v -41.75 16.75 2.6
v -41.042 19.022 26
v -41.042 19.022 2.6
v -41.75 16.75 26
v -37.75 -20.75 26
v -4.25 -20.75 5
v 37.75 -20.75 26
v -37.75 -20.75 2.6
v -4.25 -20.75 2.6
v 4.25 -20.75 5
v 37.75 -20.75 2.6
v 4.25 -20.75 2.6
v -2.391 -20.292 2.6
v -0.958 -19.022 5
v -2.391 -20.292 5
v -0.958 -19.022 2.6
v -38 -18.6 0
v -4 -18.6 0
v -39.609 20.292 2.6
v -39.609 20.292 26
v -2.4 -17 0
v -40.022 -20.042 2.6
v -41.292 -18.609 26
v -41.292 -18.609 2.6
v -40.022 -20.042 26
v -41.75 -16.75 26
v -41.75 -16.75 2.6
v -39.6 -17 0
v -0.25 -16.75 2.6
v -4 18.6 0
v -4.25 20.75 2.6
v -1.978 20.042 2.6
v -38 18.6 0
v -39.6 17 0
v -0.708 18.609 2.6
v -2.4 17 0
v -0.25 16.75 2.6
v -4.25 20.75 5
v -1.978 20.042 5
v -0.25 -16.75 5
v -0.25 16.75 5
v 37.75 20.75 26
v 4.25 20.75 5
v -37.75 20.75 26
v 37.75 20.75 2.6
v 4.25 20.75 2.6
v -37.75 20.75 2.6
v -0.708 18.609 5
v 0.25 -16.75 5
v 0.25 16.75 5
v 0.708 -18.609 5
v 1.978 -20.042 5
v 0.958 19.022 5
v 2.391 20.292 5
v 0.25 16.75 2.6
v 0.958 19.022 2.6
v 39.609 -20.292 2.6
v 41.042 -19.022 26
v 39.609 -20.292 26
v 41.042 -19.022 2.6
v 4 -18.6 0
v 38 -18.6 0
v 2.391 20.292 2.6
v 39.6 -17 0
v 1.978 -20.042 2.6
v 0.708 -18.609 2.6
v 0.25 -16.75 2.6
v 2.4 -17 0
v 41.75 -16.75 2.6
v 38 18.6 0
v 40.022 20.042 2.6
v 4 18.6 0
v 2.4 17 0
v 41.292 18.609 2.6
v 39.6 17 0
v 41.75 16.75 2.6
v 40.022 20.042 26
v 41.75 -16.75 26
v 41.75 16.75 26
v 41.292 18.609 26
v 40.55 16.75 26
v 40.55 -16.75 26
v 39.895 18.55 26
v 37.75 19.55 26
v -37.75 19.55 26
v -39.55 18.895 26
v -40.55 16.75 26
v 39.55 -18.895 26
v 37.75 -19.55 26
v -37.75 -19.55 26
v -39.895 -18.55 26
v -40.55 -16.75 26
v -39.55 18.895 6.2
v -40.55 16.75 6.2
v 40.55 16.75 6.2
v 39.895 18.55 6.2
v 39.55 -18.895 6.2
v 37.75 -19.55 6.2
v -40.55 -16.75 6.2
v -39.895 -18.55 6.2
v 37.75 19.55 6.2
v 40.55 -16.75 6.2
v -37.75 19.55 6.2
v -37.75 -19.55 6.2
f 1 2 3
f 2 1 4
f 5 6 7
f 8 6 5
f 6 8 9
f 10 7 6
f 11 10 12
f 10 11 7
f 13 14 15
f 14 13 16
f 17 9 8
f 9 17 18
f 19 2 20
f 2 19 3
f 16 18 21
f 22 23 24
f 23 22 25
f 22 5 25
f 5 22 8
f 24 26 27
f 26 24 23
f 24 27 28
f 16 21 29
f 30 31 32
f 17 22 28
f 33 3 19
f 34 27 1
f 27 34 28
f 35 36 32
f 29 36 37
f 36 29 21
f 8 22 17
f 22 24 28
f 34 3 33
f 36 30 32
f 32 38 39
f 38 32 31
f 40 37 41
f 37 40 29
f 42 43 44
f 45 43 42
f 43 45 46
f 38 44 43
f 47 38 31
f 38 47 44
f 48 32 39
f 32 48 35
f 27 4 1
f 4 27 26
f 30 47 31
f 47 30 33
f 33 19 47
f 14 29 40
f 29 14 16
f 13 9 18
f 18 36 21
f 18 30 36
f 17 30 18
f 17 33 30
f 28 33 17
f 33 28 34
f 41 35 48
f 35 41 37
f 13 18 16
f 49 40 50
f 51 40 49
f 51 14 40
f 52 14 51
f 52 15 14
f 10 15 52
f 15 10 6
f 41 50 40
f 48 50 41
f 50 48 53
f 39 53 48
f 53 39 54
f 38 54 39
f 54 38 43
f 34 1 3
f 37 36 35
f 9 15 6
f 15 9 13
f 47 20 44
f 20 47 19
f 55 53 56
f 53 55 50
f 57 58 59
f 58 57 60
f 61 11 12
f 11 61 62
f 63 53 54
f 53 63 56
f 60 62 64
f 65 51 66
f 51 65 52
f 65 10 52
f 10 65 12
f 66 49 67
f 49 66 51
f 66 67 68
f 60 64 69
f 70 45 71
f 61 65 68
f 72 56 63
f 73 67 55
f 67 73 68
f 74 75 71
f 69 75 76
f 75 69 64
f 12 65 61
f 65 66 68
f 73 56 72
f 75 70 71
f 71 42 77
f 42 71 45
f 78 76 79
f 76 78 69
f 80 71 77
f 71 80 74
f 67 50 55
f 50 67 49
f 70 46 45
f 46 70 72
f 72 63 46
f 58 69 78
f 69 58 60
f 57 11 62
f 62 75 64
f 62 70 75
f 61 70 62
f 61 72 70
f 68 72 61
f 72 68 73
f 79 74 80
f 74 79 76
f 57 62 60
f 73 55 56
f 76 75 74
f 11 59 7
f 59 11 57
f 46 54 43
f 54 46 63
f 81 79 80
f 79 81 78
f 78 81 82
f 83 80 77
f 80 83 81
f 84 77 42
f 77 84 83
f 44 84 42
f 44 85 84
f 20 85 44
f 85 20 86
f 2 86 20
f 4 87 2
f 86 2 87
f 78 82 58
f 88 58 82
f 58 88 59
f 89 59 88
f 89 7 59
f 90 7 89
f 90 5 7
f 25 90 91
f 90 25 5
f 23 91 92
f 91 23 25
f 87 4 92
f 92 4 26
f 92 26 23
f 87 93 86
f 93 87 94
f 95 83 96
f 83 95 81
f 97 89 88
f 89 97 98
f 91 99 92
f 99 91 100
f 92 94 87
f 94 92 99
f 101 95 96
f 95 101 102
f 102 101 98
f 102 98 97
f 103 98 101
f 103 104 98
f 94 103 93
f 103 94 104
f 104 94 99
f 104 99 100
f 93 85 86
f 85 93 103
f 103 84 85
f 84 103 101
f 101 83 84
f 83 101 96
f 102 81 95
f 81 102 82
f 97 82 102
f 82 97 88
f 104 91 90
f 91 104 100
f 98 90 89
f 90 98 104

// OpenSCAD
// Gridfinity-style storage bin: rounded base pads on a 42 mm grid, hollow walls
units_x = 2;       // [1:6]
units_y = 1;       // [1:6]
height_u = 3;      // [1:10]
/* [Hidden] */
grid = 42;
pad = 41.5;
pad_r = 4;
base_h = 5;
unit_h = 7;
wall = 1.2;

module rounded_square(s, r) {
  offset(r = r) square([s[0] - 2 * r, s[1] - 2 * r], center = true);
}

module base_pad() {
  hull() {
    translate([0, 0, 0]) linear_extrude(0.8) rounded_square([pad - 4.3, pad - 4.3], 1.6);
    translate([0, 0, 2.6]) linear_extrude(base_h - 2.6) rounded_square([pad, pad], pad_r);
  }
}

module bin_body() {
  w = units_x * grid - 0.5;
  d = units_y * grid - 0.5;
  h = height_u * unit_h;
  translate([0, 0, base_h])
    difference() {
      linear_extrude(h) rounded_square([w, d], pad_r);
      translate([0, 0, wall]) linear_extrude(h) rounded_square([w - 2 * wall, d - 2 * wall], pad_r - wall);
    }
}

for (i = [0 : units_x - 1], j = [0 : units_y - 1])
  translate([(i - (units_x - 1) / 2) * grid, (j - (units_y - 1) / 2) * grid, 0]) base_pad();
bin_body();
